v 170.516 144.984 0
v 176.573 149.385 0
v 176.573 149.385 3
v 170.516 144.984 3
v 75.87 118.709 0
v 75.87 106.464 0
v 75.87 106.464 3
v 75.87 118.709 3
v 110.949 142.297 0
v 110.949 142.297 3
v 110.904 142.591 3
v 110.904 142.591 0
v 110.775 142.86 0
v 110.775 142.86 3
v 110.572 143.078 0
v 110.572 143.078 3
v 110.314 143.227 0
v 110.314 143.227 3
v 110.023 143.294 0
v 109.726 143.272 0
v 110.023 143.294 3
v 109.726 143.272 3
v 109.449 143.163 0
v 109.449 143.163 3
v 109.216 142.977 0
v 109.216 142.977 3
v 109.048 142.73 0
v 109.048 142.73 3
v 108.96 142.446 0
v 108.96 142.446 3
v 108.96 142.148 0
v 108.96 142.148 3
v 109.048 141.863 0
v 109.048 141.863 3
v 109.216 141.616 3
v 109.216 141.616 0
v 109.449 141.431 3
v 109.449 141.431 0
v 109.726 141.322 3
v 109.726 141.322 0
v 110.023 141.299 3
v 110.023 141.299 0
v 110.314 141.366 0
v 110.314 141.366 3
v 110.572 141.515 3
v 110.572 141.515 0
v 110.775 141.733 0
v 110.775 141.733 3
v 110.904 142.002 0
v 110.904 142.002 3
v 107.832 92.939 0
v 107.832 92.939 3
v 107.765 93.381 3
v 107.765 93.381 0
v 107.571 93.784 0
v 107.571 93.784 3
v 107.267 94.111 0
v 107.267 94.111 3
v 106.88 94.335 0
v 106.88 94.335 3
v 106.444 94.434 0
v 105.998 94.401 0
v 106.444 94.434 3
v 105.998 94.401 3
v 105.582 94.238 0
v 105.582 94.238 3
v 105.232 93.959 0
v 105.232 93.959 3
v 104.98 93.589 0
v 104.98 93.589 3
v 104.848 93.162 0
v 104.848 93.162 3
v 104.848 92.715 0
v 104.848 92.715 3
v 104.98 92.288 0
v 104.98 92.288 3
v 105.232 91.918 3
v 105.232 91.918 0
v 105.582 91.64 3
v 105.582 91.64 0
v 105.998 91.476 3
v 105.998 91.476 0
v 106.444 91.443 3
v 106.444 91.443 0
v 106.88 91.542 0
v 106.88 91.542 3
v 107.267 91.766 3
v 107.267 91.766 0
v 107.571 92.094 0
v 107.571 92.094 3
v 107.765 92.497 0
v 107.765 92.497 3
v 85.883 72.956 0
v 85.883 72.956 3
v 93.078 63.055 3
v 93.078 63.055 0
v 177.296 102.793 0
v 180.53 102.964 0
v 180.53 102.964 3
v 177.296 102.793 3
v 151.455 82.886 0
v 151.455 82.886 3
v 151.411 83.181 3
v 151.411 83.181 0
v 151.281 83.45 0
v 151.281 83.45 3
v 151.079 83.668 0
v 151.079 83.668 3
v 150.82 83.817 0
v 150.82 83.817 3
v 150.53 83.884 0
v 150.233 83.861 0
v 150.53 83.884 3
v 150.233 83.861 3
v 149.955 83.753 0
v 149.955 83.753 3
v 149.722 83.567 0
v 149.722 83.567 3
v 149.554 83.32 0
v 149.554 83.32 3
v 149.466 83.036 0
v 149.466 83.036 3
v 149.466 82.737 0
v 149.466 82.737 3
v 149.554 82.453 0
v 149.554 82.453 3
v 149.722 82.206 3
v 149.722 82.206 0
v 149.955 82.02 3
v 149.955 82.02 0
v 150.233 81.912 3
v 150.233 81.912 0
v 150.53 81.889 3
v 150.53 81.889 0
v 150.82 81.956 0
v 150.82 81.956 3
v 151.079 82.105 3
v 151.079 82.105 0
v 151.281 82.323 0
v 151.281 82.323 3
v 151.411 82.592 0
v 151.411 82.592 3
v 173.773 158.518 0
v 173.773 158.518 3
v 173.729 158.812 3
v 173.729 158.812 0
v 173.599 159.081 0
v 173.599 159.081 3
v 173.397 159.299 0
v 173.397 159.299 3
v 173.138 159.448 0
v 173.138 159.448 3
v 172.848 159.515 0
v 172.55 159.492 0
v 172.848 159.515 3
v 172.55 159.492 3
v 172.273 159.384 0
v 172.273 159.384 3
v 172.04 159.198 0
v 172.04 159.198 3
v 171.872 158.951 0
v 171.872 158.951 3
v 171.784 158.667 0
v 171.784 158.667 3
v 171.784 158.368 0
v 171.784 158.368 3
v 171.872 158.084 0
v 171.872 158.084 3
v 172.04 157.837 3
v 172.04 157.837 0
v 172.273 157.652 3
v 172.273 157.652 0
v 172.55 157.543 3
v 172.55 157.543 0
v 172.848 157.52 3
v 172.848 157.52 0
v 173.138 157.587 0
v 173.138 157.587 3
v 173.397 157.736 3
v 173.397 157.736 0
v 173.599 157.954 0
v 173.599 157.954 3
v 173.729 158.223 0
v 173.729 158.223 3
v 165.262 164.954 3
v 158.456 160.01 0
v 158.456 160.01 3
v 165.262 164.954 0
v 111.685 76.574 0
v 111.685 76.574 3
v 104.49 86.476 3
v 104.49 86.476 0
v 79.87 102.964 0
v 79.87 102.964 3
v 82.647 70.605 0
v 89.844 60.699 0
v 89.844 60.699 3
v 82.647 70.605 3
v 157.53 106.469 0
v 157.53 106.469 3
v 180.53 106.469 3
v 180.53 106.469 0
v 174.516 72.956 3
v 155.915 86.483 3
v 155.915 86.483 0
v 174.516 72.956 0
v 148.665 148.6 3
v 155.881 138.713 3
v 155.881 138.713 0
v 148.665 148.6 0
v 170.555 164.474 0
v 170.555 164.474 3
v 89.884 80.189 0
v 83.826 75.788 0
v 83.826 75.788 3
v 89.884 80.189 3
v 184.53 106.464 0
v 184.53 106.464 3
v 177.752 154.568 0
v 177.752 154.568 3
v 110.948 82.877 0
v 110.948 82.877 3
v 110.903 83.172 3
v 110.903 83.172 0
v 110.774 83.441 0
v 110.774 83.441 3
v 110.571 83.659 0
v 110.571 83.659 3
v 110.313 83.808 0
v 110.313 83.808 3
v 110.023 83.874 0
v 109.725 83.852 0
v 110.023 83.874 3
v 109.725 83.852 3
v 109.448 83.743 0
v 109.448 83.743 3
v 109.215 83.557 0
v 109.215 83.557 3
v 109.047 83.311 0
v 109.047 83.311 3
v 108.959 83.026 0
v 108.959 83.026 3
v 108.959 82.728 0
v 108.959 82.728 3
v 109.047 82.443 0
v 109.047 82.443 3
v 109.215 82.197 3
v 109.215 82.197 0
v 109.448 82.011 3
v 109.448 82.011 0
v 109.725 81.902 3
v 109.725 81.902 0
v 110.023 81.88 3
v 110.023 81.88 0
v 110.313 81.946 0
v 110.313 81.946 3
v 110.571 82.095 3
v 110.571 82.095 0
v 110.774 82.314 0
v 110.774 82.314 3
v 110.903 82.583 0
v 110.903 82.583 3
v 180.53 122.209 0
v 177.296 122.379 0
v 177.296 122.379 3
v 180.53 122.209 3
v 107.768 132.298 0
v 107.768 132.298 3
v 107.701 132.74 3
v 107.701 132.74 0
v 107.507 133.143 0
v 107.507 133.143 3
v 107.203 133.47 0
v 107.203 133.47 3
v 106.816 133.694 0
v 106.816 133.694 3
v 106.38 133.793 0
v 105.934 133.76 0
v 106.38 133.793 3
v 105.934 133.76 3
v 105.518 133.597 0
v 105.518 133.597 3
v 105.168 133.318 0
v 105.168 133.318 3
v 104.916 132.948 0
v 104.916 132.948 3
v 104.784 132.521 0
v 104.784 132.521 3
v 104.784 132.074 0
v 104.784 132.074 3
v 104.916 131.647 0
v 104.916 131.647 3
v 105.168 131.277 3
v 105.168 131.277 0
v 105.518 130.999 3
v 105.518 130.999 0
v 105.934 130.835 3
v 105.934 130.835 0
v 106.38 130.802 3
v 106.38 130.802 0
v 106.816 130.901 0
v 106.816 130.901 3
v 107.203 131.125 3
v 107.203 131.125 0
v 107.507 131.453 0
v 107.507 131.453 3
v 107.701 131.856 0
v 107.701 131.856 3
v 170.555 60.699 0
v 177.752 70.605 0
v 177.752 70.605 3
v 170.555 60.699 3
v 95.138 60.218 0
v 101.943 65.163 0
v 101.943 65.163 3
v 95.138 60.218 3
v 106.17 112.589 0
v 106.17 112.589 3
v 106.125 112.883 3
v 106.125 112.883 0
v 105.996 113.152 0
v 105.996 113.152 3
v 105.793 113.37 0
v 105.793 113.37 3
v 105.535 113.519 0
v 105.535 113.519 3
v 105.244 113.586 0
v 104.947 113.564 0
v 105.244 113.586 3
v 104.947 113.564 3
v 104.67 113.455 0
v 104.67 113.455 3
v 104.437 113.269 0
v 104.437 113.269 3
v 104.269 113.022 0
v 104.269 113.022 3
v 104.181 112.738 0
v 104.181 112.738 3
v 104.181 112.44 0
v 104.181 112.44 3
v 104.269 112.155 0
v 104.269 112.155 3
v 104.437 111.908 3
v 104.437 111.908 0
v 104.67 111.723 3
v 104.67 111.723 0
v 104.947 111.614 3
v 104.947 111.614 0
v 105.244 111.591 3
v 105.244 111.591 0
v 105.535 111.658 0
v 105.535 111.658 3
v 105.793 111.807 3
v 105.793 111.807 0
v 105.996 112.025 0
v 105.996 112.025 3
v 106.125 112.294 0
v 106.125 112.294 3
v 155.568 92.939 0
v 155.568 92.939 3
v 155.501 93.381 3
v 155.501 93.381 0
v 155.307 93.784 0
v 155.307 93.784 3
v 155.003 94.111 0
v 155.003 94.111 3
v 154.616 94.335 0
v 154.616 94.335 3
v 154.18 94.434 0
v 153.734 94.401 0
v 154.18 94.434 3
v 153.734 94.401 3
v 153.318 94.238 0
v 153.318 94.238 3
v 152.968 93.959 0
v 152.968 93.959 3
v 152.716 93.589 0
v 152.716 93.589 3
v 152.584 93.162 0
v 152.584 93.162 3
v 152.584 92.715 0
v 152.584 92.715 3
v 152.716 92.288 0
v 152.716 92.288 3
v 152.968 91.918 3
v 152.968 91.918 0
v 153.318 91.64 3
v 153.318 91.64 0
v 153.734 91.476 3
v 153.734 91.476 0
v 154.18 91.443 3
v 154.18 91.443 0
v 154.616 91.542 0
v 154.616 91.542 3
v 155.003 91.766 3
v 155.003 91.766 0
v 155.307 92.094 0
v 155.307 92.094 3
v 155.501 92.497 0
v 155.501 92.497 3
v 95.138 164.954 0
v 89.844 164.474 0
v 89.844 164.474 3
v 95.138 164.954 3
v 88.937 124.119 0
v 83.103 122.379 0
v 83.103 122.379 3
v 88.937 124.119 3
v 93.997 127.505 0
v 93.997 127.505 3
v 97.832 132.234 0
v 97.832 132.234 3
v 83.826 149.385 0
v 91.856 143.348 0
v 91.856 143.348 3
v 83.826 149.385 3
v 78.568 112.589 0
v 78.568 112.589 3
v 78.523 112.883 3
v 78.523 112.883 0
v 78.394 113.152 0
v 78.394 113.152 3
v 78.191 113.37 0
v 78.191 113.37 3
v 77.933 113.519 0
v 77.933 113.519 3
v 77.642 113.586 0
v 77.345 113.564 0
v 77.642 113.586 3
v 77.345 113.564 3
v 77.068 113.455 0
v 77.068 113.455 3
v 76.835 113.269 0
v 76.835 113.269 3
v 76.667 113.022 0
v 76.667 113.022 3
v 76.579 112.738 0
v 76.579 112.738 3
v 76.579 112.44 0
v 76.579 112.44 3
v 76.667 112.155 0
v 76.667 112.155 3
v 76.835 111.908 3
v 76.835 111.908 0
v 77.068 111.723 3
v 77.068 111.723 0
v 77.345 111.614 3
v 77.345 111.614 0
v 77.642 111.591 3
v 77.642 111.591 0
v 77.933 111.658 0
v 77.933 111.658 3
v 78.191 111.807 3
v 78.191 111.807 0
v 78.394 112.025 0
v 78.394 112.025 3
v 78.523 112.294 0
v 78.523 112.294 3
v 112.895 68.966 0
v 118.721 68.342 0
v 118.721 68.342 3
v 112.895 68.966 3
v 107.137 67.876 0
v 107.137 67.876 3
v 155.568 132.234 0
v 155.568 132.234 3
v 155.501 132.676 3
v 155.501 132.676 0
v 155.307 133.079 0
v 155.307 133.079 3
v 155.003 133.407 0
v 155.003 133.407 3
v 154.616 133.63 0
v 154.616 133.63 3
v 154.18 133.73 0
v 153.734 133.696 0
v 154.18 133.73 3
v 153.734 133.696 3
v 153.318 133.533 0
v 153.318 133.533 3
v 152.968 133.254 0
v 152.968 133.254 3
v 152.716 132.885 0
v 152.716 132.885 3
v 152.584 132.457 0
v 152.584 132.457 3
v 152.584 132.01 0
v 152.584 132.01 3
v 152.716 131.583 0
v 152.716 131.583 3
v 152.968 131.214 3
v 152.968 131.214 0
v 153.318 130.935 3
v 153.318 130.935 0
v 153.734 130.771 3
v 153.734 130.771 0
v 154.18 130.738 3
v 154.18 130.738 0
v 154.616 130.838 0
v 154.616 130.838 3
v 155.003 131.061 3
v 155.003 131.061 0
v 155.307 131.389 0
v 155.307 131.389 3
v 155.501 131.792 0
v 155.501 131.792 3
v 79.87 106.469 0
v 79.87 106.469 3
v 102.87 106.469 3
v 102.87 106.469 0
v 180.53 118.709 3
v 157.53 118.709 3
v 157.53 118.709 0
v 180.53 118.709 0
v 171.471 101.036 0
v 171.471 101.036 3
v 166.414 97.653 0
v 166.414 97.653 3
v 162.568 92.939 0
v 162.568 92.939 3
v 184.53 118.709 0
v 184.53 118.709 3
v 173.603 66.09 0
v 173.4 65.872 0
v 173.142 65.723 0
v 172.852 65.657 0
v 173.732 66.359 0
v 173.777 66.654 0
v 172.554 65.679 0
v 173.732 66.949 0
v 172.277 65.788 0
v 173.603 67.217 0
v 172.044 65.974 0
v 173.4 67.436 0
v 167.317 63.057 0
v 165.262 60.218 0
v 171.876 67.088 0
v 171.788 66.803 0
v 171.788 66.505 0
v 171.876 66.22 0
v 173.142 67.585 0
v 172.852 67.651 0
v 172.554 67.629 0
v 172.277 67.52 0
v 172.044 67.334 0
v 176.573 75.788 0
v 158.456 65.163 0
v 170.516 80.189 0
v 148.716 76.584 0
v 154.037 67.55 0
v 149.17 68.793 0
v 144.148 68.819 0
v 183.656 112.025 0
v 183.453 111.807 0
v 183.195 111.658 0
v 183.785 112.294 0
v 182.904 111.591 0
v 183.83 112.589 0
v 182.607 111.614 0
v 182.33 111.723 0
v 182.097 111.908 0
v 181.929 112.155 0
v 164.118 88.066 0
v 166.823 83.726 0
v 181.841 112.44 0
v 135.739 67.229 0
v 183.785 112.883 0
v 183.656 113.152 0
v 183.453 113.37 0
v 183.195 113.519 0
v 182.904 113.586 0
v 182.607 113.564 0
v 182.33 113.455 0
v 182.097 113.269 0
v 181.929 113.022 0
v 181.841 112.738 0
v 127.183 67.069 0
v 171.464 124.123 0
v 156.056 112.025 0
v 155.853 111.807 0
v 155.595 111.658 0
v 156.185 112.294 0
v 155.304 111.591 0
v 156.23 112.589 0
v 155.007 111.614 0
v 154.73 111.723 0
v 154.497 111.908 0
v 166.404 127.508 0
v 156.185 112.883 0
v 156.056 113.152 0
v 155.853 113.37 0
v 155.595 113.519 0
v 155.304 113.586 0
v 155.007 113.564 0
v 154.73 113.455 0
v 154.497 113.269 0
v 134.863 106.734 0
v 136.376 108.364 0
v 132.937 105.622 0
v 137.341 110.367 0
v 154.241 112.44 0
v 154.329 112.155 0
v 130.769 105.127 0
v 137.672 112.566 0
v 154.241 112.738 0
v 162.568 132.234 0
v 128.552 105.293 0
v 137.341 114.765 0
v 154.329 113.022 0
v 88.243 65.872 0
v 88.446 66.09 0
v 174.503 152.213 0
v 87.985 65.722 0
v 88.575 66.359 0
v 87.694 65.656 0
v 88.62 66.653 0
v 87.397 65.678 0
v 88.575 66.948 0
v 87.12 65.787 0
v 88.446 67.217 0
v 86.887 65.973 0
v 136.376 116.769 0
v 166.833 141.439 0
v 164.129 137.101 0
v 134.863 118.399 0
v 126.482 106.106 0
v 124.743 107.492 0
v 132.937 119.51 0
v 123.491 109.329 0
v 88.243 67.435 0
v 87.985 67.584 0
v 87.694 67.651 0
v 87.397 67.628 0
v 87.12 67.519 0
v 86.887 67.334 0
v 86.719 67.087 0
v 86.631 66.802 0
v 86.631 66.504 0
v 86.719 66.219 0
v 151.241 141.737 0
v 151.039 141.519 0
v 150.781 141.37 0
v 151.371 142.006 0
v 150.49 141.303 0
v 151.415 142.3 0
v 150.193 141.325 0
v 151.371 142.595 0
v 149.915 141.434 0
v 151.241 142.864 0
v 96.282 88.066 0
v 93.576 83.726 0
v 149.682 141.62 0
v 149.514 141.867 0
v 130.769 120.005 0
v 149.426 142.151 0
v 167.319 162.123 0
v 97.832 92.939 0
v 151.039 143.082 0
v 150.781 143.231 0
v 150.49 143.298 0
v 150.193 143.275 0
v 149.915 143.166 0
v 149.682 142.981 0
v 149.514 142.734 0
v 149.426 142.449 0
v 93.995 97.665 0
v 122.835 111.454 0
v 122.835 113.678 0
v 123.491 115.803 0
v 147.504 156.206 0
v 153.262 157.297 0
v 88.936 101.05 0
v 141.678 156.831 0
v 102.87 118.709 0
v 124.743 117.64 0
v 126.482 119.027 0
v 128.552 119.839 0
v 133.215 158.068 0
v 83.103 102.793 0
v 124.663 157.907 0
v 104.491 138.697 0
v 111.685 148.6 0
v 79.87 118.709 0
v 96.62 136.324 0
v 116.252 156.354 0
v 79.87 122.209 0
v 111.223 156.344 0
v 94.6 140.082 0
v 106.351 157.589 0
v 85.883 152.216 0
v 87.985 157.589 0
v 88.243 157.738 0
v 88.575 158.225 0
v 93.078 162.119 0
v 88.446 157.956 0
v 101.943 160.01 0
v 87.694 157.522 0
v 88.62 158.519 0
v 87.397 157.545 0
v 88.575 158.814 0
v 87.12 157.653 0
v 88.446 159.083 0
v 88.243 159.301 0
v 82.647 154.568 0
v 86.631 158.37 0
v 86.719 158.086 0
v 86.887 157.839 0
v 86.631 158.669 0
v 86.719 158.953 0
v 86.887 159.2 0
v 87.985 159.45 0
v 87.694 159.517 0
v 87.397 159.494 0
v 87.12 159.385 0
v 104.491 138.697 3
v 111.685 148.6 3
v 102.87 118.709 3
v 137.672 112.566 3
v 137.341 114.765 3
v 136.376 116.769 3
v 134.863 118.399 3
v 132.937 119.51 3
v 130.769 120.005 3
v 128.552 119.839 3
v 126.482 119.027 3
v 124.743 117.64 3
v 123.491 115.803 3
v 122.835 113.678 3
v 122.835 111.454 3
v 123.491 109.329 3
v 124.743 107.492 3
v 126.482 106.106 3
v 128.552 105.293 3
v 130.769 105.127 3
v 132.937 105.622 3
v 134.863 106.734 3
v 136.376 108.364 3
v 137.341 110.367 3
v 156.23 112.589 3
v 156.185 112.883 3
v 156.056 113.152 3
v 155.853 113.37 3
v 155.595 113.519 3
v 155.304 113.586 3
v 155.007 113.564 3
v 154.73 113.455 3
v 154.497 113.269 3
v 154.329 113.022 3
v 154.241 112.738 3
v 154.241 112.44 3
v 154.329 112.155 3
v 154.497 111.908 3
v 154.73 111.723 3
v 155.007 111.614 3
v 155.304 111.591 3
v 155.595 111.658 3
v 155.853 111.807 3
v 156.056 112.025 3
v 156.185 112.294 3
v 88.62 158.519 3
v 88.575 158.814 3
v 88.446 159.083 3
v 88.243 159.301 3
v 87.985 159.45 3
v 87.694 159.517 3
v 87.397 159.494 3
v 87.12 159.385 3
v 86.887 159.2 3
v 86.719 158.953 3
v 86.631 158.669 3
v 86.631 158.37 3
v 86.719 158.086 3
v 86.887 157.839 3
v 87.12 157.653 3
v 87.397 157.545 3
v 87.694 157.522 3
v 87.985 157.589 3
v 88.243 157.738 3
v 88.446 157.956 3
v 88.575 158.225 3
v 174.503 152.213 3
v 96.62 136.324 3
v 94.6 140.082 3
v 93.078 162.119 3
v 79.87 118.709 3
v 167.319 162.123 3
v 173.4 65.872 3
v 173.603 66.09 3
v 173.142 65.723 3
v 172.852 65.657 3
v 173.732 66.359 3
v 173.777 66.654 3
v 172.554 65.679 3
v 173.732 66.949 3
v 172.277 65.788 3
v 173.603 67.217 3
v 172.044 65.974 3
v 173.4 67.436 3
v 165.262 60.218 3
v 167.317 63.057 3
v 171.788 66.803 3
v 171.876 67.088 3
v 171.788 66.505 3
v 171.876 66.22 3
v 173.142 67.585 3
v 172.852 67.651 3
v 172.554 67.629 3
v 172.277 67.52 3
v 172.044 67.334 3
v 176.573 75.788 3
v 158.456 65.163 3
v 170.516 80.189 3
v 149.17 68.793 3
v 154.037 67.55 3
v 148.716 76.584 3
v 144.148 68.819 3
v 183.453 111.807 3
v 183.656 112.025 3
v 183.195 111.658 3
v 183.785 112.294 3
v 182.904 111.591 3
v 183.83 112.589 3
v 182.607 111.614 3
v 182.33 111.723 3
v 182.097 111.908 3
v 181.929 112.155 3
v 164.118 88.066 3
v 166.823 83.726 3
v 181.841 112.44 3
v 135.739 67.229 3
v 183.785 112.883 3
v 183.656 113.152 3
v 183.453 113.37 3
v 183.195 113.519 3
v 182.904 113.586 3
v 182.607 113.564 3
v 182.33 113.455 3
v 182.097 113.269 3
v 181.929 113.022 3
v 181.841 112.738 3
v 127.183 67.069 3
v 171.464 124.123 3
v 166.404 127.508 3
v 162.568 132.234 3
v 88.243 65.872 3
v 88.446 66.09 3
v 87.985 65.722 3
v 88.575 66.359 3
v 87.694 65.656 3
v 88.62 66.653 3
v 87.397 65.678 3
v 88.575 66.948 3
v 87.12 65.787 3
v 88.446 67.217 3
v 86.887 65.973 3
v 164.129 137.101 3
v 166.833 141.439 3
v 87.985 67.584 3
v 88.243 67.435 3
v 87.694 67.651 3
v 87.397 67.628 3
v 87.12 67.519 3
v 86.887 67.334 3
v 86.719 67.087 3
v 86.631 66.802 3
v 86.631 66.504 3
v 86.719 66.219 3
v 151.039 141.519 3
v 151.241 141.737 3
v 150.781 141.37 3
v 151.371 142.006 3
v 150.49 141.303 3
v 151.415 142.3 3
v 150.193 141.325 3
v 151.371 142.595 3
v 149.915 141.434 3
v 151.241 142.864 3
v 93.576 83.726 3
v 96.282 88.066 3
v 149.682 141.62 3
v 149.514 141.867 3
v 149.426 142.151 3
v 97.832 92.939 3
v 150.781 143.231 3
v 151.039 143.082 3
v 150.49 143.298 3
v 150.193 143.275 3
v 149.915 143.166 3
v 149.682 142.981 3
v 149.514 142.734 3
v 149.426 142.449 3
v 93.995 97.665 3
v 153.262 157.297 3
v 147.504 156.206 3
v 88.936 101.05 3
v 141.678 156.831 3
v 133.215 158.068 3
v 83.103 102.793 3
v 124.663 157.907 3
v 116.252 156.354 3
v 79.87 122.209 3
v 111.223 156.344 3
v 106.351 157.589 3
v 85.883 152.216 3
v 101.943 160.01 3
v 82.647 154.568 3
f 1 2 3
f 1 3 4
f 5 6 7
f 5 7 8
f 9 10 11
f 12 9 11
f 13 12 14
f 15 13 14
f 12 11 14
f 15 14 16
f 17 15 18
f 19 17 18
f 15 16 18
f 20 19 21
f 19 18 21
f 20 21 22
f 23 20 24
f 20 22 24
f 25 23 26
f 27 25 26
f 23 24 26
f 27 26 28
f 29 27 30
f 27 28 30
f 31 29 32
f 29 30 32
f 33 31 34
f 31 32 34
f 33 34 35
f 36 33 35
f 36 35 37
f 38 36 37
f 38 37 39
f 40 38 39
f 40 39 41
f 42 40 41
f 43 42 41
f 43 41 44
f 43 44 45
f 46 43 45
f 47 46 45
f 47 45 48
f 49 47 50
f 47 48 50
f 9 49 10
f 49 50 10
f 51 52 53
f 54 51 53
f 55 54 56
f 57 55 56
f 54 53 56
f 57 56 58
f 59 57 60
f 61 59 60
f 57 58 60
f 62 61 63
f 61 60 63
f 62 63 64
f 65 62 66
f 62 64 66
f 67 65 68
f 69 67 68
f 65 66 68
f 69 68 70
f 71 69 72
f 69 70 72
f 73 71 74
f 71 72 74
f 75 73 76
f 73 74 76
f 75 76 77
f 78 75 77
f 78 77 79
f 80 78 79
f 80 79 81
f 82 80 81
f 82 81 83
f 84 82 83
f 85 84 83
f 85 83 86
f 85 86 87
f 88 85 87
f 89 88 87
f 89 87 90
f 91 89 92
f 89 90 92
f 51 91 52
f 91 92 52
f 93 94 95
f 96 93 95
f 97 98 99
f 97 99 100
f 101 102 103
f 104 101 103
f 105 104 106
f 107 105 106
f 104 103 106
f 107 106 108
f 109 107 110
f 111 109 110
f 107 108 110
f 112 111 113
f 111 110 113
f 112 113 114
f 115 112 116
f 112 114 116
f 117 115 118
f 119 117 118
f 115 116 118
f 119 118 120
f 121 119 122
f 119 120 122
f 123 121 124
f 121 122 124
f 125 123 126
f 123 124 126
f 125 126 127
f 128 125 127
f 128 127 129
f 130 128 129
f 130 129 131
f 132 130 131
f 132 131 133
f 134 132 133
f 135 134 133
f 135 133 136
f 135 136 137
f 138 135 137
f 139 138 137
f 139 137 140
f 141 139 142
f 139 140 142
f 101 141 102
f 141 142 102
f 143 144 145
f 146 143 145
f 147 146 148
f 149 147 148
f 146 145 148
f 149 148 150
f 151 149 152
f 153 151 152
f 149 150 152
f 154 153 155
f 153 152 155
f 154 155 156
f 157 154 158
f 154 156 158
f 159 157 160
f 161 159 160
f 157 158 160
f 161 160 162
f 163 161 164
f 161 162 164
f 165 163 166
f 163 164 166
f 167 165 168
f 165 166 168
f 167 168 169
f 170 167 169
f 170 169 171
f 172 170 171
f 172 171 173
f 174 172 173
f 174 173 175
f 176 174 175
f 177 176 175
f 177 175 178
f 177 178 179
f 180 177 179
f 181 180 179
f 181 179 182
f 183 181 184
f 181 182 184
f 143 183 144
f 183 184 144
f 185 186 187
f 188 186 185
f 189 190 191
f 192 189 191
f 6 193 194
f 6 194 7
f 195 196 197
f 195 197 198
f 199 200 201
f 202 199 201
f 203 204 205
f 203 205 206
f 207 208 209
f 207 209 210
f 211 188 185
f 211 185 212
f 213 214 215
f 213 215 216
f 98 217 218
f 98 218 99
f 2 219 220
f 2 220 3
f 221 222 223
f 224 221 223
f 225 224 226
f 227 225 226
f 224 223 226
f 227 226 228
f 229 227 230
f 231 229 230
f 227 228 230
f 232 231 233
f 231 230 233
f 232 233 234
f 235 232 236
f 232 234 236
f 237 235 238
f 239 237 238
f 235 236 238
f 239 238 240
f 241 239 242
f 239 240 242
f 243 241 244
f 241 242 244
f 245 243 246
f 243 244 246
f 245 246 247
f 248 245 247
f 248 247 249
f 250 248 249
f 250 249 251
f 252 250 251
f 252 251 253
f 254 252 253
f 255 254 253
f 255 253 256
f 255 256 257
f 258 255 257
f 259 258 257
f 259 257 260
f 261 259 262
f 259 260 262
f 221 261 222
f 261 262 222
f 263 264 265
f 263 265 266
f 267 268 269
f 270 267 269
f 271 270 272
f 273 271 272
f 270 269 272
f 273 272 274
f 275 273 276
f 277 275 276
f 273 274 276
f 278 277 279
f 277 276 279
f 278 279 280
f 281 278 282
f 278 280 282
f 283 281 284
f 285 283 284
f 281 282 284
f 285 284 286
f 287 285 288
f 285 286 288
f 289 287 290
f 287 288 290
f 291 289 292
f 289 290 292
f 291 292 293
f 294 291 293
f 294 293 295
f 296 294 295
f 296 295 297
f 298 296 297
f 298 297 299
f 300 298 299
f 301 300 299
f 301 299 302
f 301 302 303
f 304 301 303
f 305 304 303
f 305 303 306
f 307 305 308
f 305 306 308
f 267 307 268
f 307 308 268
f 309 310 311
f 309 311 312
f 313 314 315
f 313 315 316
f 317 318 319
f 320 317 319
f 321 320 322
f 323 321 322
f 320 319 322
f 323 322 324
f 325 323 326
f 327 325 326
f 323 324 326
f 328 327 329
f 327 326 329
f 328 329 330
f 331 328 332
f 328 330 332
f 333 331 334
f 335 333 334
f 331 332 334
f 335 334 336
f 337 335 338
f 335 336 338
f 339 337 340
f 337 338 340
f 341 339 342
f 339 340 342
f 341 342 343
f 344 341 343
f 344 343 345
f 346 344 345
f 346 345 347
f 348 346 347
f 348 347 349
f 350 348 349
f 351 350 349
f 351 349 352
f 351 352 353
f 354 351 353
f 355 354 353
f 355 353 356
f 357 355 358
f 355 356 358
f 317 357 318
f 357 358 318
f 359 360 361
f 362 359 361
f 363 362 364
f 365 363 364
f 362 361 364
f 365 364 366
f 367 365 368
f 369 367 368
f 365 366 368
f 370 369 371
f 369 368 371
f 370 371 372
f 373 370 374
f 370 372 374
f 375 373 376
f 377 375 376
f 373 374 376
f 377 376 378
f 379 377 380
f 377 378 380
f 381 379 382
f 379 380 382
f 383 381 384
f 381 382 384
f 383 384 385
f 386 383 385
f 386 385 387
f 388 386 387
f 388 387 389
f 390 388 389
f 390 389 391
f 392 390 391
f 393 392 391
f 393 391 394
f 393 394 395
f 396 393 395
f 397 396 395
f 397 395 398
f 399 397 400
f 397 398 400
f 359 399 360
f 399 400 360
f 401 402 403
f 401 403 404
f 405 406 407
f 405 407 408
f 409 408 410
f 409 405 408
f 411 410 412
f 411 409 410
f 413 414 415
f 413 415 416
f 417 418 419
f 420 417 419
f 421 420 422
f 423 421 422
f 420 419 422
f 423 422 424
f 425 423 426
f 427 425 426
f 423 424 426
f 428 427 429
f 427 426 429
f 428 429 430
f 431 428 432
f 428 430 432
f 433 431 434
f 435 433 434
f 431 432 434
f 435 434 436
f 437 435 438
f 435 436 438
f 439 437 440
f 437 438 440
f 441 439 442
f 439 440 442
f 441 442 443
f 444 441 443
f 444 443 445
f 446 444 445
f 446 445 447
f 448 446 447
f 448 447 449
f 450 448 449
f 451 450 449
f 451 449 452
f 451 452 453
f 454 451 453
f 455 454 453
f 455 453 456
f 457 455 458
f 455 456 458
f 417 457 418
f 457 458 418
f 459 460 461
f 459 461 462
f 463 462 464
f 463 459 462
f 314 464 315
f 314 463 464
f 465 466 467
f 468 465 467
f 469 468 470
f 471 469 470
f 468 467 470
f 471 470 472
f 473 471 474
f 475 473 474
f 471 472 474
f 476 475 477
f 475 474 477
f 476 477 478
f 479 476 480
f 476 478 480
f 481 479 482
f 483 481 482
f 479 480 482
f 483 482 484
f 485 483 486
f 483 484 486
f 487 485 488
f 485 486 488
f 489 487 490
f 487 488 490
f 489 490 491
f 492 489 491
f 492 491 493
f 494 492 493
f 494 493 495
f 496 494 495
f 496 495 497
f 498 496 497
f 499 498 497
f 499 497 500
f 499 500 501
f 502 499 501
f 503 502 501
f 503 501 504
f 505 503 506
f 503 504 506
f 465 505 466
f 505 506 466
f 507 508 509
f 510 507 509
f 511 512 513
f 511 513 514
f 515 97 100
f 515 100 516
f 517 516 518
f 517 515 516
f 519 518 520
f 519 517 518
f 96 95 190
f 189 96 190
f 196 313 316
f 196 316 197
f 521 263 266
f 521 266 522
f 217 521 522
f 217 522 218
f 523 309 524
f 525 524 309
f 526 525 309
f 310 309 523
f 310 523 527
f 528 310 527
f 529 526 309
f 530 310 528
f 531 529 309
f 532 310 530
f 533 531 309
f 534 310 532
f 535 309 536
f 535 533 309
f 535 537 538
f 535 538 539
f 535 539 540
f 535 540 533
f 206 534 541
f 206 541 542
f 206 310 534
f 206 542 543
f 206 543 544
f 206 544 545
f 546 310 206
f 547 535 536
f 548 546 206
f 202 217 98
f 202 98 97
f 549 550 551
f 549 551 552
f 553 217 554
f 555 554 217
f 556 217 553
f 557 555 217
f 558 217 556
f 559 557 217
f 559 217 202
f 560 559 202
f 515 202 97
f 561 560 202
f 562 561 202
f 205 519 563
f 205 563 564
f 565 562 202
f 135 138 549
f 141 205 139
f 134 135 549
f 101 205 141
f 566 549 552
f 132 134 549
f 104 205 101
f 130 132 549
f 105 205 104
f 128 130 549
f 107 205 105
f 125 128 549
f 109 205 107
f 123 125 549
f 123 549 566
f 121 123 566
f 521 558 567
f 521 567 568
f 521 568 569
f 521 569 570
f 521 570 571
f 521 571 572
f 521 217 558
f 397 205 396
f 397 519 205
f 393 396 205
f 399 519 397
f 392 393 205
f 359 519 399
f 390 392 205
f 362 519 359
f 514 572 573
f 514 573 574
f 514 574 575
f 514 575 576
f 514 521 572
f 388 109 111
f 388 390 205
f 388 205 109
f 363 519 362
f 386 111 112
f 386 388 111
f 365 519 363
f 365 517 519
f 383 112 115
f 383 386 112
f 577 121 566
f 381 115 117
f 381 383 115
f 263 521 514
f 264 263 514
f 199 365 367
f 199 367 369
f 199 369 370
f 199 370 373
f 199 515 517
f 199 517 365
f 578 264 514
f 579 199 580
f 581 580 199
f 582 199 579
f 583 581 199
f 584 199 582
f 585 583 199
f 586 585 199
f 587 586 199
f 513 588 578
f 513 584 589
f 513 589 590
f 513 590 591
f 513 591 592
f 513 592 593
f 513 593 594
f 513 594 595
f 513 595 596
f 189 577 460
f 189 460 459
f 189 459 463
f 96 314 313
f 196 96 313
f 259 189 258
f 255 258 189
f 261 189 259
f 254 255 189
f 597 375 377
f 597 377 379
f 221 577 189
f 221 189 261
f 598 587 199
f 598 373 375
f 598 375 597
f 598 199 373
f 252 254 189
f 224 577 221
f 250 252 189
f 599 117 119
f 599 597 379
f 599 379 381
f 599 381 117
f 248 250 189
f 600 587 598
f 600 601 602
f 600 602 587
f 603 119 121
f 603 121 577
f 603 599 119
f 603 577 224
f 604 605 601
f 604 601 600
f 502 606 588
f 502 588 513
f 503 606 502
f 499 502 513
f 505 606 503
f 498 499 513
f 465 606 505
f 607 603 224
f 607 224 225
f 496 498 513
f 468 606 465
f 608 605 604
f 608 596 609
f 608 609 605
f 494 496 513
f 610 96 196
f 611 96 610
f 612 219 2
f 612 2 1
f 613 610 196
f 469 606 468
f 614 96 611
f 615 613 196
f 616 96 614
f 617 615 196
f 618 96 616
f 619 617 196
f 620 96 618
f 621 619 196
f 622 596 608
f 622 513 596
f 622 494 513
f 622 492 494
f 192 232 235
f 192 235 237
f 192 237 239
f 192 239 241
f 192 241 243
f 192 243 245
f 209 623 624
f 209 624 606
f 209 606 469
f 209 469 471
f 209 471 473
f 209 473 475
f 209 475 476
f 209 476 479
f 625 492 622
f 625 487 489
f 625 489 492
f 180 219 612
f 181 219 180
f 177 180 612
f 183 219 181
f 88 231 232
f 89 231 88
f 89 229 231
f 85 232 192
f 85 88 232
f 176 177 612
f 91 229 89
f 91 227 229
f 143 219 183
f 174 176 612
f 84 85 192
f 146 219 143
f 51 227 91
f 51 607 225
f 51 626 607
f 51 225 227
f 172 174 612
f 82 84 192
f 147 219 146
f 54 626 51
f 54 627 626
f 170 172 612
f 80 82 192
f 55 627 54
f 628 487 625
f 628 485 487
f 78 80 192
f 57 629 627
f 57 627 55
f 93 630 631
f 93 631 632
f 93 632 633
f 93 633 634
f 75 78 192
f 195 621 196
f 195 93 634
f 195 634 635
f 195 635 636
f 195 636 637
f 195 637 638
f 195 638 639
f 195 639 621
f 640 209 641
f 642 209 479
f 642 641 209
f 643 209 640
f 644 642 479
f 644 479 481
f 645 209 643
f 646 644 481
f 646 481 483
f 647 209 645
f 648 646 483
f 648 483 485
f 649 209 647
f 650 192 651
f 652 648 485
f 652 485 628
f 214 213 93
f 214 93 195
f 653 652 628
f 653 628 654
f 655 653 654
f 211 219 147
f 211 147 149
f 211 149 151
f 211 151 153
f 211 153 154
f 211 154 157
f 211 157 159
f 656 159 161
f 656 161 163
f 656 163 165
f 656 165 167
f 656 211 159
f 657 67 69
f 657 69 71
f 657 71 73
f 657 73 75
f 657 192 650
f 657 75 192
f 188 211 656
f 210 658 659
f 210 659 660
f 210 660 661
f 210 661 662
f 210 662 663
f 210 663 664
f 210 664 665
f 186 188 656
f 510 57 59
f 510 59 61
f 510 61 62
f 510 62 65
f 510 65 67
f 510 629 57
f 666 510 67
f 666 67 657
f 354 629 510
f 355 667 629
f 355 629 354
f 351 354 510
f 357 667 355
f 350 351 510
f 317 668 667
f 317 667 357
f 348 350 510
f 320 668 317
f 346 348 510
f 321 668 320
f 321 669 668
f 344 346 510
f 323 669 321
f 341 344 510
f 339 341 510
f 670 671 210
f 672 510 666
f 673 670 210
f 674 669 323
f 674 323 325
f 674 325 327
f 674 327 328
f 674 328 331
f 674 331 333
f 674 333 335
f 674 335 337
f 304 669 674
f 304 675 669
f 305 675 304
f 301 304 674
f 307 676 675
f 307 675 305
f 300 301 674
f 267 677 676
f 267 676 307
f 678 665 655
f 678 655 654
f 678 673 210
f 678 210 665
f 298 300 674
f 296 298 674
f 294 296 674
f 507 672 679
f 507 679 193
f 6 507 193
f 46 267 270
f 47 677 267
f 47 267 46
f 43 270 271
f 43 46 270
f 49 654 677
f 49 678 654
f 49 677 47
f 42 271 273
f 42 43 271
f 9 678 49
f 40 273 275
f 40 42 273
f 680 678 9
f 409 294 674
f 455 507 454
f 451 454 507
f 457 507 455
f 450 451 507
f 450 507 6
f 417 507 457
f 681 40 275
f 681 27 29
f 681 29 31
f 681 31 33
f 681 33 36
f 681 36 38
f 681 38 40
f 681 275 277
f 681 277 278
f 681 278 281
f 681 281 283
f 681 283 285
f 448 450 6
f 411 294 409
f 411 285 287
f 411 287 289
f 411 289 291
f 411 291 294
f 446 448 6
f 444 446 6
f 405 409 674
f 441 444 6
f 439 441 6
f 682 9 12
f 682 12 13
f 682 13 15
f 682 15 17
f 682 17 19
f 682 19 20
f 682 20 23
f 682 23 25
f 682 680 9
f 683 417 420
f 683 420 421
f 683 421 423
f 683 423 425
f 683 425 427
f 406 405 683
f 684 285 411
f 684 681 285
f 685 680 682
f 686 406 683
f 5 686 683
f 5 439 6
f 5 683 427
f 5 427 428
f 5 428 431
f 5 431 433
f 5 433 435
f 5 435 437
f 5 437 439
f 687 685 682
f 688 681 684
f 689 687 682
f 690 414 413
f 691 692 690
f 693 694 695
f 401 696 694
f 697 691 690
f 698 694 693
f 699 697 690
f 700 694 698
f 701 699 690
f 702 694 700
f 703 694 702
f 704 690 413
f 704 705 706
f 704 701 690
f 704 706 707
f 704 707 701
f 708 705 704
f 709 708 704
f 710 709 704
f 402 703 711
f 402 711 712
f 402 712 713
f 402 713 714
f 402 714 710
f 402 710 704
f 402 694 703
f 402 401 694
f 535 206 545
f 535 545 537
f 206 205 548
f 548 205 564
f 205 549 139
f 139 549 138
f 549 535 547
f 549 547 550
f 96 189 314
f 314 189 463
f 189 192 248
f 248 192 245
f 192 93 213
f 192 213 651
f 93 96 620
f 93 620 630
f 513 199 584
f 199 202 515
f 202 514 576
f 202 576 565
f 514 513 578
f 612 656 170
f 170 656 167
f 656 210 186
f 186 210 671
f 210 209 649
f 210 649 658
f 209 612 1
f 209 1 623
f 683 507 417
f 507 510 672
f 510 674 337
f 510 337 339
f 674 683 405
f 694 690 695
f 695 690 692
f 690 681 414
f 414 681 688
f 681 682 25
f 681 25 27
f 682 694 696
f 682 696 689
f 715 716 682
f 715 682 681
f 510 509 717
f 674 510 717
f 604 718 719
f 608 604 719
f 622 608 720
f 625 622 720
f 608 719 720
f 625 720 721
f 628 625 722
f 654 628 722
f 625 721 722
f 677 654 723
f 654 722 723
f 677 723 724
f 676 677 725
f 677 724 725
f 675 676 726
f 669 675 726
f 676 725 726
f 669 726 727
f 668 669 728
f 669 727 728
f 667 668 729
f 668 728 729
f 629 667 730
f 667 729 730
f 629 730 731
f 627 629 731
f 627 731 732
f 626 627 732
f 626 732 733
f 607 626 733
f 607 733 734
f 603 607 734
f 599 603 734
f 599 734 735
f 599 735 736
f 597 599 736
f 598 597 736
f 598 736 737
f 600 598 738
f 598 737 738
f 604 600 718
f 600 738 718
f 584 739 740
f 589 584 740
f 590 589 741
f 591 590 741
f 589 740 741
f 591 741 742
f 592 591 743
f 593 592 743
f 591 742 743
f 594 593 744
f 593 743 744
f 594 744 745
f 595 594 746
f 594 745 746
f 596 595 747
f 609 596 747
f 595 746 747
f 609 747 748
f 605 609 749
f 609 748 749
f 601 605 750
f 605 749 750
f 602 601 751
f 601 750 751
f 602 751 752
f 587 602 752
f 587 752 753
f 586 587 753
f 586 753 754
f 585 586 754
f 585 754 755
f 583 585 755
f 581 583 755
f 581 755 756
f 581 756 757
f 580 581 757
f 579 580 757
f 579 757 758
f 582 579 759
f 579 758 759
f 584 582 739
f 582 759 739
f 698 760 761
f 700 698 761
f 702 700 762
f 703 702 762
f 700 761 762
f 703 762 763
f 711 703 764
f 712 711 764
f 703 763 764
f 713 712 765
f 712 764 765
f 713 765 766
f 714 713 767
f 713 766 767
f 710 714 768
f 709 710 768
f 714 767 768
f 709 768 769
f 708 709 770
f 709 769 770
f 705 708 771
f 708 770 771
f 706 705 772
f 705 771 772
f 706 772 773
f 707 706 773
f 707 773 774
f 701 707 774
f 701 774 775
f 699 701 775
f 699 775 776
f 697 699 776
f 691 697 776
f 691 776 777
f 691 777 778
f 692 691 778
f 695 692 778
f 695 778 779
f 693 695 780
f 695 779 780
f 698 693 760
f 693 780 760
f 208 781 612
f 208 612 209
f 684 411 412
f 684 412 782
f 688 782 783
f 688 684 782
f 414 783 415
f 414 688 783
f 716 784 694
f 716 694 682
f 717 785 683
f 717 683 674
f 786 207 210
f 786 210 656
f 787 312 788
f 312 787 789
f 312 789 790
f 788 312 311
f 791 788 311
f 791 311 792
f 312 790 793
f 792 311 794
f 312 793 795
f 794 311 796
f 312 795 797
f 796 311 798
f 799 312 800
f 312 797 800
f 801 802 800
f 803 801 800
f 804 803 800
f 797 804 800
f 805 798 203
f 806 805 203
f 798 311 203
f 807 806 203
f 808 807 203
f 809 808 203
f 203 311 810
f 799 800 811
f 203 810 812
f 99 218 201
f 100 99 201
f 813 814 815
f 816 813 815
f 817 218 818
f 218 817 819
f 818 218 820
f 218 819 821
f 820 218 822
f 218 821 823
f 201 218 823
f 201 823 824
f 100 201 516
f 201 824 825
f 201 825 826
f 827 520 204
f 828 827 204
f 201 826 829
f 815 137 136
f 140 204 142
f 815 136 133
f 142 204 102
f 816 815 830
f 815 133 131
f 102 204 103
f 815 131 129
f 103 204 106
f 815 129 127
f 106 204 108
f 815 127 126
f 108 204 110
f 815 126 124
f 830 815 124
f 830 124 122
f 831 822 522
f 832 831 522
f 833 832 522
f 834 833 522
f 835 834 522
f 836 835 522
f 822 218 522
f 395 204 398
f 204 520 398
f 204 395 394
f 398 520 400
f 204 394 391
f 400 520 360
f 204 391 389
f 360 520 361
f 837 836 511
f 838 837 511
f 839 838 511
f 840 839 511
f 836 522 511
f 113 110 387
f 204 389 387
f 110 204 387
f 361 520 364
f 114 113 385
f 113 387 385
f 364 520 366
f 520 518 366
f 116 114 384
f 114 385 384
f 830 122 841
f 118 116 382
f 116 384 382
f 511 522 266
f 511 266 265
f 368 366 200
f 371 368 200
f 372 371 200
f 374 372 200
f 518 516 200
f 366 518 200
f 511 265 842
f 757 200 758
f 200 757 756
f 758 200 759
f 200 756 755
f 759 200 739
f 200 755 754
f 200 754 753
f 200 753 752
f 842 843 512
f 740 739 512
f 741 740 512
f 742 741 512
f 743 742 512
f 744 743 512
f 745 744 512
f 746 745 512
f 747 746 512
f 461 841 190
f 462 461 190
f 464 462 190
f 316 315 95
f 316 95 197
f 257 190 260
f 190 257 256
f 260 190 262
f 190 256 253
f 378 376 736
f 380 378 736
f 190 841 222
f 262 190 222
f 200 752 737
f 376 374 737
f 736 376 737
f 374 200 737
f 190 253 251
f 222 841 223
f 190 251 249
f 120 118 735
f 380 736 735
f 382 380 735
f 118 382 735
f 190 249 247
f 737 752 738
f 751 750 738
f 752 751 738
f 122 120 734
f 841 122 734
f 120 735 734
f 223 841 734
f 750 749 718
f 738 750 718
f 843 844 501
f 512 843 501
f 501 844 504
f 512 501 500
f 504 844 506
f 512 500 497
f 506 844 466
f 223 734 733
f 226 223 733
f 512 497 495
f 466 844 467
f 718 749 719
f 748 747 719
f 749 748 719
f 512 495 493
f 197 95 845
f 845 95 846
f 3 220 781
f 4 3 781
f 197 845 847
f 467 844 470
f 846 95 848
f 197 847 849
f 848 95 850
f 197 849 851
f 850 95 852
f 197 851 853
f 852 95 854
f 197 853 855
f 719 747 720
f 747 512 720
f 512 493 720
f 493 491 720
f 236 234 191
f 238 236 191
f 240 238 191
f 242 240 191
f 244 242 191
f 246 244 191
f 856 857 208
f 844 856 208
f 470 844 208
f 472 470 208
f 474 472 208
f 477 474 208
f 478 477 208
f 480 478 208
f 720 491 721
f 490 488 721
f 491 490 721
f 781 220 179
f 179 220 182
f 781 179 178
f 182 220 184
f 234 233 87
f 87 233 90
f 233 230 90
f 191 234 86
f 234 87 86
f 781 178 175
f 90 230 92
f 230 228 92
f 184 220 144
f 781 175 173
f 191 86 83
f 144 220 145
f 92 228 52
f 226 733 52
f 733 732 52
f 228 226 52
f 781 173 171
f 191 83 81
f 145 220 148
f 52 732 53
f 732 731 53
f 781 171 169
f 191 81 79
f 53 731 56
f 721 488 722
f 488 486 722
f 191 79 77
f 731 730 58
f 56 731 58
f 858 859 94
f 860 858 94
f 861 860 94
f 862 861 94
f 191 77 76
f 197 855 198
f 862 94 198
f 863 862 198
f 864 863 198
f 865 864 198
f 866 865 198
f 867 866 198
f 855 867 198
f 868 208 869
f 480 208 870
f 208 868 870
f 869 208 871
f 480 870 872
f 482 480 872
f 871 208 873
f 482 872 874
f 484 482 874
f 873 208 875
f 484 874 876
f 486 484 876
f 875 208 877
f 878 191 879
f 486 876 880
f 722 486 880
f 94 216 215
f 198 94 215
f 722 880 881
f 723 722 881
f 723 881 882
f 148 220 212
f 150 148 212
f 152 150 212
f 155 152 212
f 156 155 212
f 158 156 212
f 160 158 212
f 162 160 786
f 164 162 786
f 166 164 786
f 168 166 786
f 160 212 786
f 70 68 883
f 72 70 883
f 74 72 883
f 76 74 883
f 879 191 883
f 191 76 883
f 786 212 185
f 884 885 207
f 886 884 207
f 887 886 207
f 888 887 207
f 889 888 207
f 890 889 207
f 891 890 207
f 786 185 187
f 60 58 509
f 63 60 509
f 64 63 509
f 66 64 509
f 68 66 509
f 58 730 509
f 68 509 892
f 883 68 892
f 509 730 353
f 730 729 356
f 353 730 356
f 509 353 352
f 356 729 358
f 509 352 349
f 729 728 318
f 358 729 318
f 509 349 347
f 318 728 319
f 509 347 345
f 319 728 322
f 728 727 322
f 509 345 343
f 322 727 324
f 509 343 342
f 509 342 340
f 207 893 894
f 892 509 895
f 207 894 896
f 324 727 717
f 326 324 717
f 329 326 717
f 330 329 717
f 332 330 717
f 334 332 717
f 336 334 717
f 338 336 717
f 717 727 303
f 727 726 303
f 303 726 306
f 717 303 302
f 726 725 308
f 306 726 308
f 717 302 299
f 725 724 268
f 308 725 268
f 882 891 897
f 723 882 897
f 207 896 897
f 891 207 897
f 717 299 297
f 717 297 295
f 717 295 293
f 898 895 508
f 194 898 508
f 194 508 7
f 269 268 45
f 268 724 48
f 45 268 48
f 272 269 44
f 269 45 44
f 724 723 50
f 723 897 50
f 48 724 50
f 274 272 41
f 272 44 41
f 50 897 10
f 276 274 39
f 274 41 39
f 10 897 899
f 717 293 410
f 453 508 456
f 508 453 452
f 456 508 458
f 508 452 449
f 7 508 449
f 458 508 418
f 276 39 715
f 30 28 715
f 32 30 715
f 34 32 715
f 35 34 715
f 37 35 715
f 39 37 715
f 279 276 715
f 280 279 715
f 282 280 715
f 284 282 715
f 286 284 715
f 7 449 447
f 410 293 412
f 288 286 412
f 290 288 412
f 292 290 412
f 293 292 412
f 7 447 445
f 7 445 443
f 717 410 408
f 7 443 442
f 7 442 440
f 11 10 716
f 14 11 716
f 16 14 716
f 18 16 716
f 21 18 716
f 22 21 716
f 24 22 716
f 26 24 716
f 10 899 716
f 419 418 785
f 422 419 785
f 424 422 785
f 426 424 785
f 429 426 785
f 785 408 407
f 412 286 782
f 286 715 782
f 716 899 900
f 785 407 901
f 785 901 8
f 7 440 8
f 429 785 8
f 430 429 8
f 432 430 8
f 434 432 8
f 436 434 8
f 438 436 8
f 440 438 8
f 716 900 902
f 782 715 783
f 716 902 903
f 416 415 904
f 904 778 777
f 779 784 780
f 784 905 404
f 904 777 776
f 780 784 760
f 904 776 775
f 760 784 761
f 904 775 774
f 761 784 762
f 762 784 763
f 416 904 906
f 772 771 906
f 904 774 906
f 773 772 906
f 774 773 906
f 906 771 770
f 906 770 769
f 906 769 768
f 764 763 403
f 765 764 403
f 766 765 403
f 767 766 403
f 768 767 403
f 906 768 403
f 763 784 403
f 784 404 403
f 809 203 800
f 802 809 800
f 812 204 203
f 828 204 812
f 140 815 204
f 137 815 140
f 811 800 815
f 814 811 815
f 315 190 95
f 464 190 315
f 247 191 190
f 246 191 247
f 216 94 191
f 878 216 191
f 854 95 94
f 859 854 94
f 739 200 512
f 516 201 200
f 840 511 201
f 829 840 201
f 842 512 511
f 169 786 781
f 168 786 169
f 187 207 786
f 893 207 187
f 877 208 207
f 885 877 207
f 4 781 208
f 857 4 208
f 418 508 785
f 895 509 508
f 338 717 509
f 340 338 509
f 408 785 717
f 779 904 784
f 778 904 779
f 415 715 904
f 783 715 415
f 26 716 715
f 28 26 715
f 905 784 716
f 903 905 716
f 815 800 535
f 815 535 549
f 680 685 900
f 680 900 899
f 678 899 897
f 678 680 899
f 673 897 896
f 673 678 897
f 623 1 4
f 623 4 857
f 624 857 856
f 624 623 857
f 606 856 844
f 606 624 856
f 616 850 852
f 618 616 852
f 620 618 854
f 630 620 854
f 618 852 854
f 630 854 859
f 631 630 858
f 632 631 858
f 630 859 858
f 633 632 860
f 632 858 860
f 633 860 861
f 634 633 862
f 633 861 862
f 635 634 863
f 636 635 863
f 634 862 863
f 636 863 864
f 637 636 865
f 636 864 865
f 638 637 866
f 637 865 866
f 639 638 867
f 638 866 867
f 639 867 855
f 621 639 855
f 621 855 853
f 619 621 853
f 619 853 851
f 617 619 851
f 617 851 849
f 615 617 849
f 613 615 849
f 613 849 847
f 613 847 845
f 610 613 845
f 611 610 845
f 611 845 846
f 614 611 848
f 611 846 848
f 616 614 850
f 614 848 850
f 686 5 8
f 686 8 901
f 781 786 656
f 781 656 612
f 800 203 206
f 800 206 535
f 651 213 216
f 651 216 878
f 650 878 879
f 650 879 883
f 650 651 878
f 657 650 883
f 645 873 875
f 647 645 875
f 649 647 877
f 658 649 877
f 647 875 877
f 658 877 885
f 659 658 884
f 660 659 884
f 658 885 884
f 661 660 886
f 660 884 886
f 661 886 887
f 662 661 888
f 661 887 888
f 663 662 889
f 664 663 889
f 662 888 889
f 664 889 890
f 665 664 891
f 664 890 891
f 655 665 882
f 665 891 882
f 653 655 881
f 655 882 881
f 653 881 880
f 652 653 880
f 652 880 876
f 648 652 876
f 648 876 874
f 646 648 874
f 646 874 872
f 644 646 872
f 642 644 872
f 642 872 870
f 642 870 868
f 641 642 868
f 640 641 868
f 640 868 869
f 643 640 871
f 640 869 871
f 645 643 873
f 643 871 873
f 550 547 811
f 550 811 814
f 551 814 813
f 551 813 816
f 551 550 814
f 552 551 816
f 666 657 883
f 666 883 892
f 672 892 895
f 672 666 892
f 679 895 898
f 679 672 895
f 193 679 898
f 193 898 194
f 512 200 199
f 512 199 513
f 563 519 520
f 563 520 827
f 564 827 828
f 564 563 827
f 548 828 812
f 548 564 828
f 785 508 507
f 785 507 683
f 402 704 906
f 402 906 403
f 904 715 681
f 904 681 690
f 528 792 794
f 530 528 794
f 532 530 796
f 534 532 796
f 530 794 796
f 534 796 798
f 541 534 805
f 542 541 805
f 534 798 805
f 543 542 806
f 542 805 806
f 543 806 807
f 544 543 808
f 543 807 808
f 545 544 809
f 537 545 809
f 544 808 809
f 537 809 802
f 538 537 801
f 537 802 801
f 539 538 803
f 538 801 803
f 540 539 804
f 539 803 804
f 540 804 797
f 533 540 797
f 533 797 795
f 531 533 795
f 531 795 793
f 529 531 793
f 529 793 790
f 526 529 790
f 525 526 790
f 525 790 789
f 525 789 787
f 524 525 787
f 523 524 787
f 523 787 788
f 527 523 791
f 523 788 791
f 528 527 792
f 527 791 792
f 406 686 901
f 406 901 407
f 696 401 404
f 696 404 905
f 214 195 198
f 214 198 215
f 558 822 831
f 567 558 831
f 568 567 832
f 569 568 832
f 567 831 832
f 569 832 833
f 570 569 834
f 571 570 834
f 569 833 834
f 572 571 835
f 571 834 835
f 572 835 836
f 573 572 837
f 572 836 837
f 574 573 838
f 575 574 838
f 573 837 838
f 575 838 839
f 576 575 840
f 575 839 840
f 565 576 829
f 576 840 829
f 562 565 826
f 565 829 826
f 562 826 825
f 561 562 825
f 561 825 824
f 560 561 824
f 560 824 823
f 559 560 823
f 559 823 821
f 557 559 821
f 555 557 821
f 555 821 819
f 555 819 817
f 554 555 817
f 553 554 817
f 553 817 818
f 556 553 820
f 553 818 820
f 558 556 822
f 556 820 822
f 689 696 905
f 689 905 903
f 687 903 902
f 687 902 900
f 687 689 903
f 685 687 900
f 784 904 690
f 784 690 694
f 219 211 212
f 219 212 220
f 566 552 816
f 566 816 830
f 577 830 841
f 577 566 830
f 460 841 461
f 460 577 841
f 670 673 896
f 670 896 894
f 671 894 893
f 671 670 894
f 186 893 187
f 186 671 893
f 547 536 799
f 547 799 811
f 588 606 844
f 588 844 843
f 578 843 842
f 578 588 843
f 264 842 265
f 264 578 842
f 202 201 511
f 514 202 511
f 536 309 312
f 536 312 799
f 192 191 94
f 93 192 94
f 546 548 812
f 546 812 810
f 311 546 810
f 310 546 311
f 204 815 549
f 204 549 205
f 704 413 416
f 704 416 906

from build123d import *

# Parameters (mm, degrees)
BOSS_EXTRUDE1_DEPTH = 3
SKETCH2_W           = 23
SKETCH2_H           = 12.24
CUT_EXTRUDE1_DEPTH  = 3
SKETCH3_R           = 7.46
SKETCH3_R_2         = 1
CUT_EXTRUDE2_DEPTH  = 3
SKETCH4_R           = 1.5
CUT_EXTRUDE4_DEPTH  = 3


with BuildPart() as part:
    # Sketch1 → Boss-Extrude1 (new body)
    with BuildSketch(Plane.XY):
        with BuildLine():
            Line((82.647113629, 154.567509506), (89.844393112, 164.473715786))
            Line((89.844393112, 164.473715786), (95.137710251, 164.954136674))
            Line((95.137710251, 164.954136674), (101.943215616, 160.009648062))
            ThreePointArc((101.943215616, 160.009648062), (108.747642501, 156.812557566), (116.251704746, 156.353577499))
            ThreePointArc((116.251704746, 156.353577499), (128.935389479, 158.162930803), (141.678042243, 156.830857858))
            ThreePointArc((141.678042243, 156.830857858), (150.42338057, 156.539561763), (158.456083243, 160.009645858))
            Line((158.456083243, 160.009645858), (165.261591353, 164.954136376))
            Line((165.261591353, 164.954136376), (170.55490849, 164.473715466))
            Line((170.55490849, 164.473715466), (177.752187889, 154.567509125))
            Line((177.752187889, 154.567509125), (176.573368159, 149.384810766))
            Line((176.573368159, 149.384810766), (170.515619404, 144.983599161))
            ThreePointArc((170.515619404, 144.983599161), (165.346551478, 139.353755533), (162.56771378, 132.23389152))
            ThreePointArc((162.56771378, 132.23389152), (168.807132787, 125.625610798), (177.296006603, 122.379267473))
            Line((177.296006603, 122.379267473), (180.529625637, 122.208660353))
            Line((180.529625637, 122.208660353), (184.529626293, 118.70866071))
            Line((184.529626293, 118.70866071), (184.529626293, 106.463914621))
            Line((184.529626293, 106.463914621), (180.529628861, 102.963911295))
            Line((180.529628861, 102.963911295), (177.296136644, 102.79331796))
            ThreePointArc((177.296136644, 102.79331796), (168.816865326, 99.532528302), (162.567726238, 92.938663582))
            ThreePointArc((162.567726238, 92.938663582), (165.335032155, 85.811599743), (170.515615031, 80.188915148))
            Line((170.515615031, 80.188915148), (176.573365794, 75.787706307))
            Line((176.573365794, 75.787706307), (177.752187889, 70.605008486))
            Line((177.752187889, 70.605008486), (170.55491301, 60.698798861))
            Line((170.55491301, 60.698798861), (165.261596092, 60.218375535))
            Line((165.261596092, 60.218375535), (158.456093799, 65.162857082))
            ThreePointArc((158.456093799, 65.162857082), (151.641647942, 68.320751195), (144.1475976, 68.818924897))
            ThreePointArc((144.1475976, 68.818924897), (131.464672299, 66.969153974), (118.721260324, 68.341632719))
            ThreePointArc((118.721260324, 68.341632719), (109.975917376, 68.632921623), (101.943212729, 65.162831055))
            Line((101.943212729, 65.162831055), (95.13771499, 60.21834324))
            Line((95.13771499, 60.21834324), (89.844397632, 60.698761712))
            Line((89.844397632, 60.698761712), (82.647113629, 70.604964708))
            Line((82.647113629, 70.604964708), (83.825933315, 75.787663077))
            Line((83.825933315, 75.787663077), (89.883680023, 80.188877497))
            ThreePointArc((89.883680023, 80.188877497), (95.064494698, 85.811419139), (97.831557073, 92.938633252))
            ThreePointArc((97.831557073, 92.938633252), (91.592138066, 99.546913975), (83.10326425, 102.7932573))
            Line((83.10326425, 102.7932573), (79.869645216, 102.96386442))
            Line((79.869645216, 102.96386442), (75.86964456, 106.463864062))
            Line((75.86964456, 106.463864062), (75.86964456, 118.708610151))
            Line((75.86964456, 118.708610151), (79.869645216, 122.208609794))
            Line((79.869645216, 122.208609794), (83.10313759, 122.37920015))
            ThreePointArc((83.10313759, 122.37920015), (91.594370453, 125.622109158), (97.831557073, 132.233840961))
            ThreePointArc((97.831557073, 132.233840961), (95.706766675, 138.255067903), (91.855628915, 143.348067616))
            Line((91.855628915, 143.348067616), (83.825933315, 149.384811137))
            Line((83.825933315, 149.384811137), (82.647113629, 154.567509506))
        make_face()
    extrude(amount=BOSS_EXTRUDE1_DEPTH)

    # Sketch2 → Cut-Extrude1 (cut)
    with BuildSketch(Plane.XY.offset(3)):
        Polygon((85.883180637, 152.216369421), (93.077671686, 162.118737751), (111.685063156, 148.599677772), (104.490572106, 138.697309442), align=None)
        Polygon((111.684568391, 76.57424171), (104.489714954, 86.476346739), (85.883095664, 72.956224001), (93.077671686, 63.054500773), align=None)
        with Locations((91.369645216, 112.588609794)):
            Rectangle(SKETCH2_W, SKETCH2_H)
        Polygon((167.318839084, 162.122576423), (174.502849909, 152.212602231), (155.881166379, 138.713235486), (148.664694499, 148.599677772), align=None)
        with Locations((169.029625637, 112.588609794)):
            Rectangle(SKETCH2_W, SKETCH2_H)
        Polygon((174.516118852, 72.956145779), (167.3172806, 63.056937335), (148.715826824, 76.584166078), (155.914665077, 86.483374522), align=None)
    extrude(amount=-CUT_EXTRUDE1_DEPTH, mode=Mode.SUBTRACT)

    # Sketch3 → Cut-Extrude2 (cut)
    with BuildSketch(Plane.XY.offset(3)):
        with Locations((130.211941481, 112.566154055)):
            Circle(SKETCH3_R)
        with Locations((87.619687014, 158.519459583)):
            Circle(SKETCH3_R_2)
        with Locations((109.948556778, 142.296587609)):
            Circle(SKETCH3_R_2)
        with Locations((172.773012849, 158.517526001)):
            Circle(SKETCH3_R_2)
        with Locations((150.415193897, 142.300427521)):
            Circle(SKETCH3_R_2)
        with Locations((182.829625637, 112.588609794)):
            Circle(SKETCH3_R_2)
        with Locations((155.229625637, 112.588609794)):
            Circle(SKETCH3_R_2)
        with Locations((105.169645216, 112.588609794)):
            Circle(SKETCH3_R_2)
        with Locations((77.567644425, 112.588609794)):
            Circle(SKETCH3_R_2)
        with Locations((109.947817472, 82.877287408)):
            Circle(SKETCH3_R_2)
        with Locations((87.619707876, 66.653369203)):
            Circle(SKETCH3_R_2)
        with Locations((172.776845103, 66.653818683)):
            Circle(SKETCH3_R_2)
        with Locations((150.455100573, 82.886493174)):
            Circle(SKETCH3_R_2)
    extrude(amount=-CUT_EXTRUDE2_DEPTH, mode=Mode.SUBTRACT)

    # Sketch4 → Cut-Extrude4 (cut)
    with BuildSketch(Plane.XY.offset(3)):
        with Locations((106.267728038, 132.297669996)):
            Circle(SKETCH4_R)
        with Locations((154.06771378, 132.23389152)):
            Circle(SKETCH4_R)
        with Locations((106.331557073, 92.938633252)):
            Circle(SKETCH4_R)
        with Locations((154.067726238, 92.938663582)):
            Circle(SKETCH4_R)
    extrude(amount=-CUT_EXTRUDE4_DEPTH, mode=Mode.SUBTRACT)


solid = part.part
